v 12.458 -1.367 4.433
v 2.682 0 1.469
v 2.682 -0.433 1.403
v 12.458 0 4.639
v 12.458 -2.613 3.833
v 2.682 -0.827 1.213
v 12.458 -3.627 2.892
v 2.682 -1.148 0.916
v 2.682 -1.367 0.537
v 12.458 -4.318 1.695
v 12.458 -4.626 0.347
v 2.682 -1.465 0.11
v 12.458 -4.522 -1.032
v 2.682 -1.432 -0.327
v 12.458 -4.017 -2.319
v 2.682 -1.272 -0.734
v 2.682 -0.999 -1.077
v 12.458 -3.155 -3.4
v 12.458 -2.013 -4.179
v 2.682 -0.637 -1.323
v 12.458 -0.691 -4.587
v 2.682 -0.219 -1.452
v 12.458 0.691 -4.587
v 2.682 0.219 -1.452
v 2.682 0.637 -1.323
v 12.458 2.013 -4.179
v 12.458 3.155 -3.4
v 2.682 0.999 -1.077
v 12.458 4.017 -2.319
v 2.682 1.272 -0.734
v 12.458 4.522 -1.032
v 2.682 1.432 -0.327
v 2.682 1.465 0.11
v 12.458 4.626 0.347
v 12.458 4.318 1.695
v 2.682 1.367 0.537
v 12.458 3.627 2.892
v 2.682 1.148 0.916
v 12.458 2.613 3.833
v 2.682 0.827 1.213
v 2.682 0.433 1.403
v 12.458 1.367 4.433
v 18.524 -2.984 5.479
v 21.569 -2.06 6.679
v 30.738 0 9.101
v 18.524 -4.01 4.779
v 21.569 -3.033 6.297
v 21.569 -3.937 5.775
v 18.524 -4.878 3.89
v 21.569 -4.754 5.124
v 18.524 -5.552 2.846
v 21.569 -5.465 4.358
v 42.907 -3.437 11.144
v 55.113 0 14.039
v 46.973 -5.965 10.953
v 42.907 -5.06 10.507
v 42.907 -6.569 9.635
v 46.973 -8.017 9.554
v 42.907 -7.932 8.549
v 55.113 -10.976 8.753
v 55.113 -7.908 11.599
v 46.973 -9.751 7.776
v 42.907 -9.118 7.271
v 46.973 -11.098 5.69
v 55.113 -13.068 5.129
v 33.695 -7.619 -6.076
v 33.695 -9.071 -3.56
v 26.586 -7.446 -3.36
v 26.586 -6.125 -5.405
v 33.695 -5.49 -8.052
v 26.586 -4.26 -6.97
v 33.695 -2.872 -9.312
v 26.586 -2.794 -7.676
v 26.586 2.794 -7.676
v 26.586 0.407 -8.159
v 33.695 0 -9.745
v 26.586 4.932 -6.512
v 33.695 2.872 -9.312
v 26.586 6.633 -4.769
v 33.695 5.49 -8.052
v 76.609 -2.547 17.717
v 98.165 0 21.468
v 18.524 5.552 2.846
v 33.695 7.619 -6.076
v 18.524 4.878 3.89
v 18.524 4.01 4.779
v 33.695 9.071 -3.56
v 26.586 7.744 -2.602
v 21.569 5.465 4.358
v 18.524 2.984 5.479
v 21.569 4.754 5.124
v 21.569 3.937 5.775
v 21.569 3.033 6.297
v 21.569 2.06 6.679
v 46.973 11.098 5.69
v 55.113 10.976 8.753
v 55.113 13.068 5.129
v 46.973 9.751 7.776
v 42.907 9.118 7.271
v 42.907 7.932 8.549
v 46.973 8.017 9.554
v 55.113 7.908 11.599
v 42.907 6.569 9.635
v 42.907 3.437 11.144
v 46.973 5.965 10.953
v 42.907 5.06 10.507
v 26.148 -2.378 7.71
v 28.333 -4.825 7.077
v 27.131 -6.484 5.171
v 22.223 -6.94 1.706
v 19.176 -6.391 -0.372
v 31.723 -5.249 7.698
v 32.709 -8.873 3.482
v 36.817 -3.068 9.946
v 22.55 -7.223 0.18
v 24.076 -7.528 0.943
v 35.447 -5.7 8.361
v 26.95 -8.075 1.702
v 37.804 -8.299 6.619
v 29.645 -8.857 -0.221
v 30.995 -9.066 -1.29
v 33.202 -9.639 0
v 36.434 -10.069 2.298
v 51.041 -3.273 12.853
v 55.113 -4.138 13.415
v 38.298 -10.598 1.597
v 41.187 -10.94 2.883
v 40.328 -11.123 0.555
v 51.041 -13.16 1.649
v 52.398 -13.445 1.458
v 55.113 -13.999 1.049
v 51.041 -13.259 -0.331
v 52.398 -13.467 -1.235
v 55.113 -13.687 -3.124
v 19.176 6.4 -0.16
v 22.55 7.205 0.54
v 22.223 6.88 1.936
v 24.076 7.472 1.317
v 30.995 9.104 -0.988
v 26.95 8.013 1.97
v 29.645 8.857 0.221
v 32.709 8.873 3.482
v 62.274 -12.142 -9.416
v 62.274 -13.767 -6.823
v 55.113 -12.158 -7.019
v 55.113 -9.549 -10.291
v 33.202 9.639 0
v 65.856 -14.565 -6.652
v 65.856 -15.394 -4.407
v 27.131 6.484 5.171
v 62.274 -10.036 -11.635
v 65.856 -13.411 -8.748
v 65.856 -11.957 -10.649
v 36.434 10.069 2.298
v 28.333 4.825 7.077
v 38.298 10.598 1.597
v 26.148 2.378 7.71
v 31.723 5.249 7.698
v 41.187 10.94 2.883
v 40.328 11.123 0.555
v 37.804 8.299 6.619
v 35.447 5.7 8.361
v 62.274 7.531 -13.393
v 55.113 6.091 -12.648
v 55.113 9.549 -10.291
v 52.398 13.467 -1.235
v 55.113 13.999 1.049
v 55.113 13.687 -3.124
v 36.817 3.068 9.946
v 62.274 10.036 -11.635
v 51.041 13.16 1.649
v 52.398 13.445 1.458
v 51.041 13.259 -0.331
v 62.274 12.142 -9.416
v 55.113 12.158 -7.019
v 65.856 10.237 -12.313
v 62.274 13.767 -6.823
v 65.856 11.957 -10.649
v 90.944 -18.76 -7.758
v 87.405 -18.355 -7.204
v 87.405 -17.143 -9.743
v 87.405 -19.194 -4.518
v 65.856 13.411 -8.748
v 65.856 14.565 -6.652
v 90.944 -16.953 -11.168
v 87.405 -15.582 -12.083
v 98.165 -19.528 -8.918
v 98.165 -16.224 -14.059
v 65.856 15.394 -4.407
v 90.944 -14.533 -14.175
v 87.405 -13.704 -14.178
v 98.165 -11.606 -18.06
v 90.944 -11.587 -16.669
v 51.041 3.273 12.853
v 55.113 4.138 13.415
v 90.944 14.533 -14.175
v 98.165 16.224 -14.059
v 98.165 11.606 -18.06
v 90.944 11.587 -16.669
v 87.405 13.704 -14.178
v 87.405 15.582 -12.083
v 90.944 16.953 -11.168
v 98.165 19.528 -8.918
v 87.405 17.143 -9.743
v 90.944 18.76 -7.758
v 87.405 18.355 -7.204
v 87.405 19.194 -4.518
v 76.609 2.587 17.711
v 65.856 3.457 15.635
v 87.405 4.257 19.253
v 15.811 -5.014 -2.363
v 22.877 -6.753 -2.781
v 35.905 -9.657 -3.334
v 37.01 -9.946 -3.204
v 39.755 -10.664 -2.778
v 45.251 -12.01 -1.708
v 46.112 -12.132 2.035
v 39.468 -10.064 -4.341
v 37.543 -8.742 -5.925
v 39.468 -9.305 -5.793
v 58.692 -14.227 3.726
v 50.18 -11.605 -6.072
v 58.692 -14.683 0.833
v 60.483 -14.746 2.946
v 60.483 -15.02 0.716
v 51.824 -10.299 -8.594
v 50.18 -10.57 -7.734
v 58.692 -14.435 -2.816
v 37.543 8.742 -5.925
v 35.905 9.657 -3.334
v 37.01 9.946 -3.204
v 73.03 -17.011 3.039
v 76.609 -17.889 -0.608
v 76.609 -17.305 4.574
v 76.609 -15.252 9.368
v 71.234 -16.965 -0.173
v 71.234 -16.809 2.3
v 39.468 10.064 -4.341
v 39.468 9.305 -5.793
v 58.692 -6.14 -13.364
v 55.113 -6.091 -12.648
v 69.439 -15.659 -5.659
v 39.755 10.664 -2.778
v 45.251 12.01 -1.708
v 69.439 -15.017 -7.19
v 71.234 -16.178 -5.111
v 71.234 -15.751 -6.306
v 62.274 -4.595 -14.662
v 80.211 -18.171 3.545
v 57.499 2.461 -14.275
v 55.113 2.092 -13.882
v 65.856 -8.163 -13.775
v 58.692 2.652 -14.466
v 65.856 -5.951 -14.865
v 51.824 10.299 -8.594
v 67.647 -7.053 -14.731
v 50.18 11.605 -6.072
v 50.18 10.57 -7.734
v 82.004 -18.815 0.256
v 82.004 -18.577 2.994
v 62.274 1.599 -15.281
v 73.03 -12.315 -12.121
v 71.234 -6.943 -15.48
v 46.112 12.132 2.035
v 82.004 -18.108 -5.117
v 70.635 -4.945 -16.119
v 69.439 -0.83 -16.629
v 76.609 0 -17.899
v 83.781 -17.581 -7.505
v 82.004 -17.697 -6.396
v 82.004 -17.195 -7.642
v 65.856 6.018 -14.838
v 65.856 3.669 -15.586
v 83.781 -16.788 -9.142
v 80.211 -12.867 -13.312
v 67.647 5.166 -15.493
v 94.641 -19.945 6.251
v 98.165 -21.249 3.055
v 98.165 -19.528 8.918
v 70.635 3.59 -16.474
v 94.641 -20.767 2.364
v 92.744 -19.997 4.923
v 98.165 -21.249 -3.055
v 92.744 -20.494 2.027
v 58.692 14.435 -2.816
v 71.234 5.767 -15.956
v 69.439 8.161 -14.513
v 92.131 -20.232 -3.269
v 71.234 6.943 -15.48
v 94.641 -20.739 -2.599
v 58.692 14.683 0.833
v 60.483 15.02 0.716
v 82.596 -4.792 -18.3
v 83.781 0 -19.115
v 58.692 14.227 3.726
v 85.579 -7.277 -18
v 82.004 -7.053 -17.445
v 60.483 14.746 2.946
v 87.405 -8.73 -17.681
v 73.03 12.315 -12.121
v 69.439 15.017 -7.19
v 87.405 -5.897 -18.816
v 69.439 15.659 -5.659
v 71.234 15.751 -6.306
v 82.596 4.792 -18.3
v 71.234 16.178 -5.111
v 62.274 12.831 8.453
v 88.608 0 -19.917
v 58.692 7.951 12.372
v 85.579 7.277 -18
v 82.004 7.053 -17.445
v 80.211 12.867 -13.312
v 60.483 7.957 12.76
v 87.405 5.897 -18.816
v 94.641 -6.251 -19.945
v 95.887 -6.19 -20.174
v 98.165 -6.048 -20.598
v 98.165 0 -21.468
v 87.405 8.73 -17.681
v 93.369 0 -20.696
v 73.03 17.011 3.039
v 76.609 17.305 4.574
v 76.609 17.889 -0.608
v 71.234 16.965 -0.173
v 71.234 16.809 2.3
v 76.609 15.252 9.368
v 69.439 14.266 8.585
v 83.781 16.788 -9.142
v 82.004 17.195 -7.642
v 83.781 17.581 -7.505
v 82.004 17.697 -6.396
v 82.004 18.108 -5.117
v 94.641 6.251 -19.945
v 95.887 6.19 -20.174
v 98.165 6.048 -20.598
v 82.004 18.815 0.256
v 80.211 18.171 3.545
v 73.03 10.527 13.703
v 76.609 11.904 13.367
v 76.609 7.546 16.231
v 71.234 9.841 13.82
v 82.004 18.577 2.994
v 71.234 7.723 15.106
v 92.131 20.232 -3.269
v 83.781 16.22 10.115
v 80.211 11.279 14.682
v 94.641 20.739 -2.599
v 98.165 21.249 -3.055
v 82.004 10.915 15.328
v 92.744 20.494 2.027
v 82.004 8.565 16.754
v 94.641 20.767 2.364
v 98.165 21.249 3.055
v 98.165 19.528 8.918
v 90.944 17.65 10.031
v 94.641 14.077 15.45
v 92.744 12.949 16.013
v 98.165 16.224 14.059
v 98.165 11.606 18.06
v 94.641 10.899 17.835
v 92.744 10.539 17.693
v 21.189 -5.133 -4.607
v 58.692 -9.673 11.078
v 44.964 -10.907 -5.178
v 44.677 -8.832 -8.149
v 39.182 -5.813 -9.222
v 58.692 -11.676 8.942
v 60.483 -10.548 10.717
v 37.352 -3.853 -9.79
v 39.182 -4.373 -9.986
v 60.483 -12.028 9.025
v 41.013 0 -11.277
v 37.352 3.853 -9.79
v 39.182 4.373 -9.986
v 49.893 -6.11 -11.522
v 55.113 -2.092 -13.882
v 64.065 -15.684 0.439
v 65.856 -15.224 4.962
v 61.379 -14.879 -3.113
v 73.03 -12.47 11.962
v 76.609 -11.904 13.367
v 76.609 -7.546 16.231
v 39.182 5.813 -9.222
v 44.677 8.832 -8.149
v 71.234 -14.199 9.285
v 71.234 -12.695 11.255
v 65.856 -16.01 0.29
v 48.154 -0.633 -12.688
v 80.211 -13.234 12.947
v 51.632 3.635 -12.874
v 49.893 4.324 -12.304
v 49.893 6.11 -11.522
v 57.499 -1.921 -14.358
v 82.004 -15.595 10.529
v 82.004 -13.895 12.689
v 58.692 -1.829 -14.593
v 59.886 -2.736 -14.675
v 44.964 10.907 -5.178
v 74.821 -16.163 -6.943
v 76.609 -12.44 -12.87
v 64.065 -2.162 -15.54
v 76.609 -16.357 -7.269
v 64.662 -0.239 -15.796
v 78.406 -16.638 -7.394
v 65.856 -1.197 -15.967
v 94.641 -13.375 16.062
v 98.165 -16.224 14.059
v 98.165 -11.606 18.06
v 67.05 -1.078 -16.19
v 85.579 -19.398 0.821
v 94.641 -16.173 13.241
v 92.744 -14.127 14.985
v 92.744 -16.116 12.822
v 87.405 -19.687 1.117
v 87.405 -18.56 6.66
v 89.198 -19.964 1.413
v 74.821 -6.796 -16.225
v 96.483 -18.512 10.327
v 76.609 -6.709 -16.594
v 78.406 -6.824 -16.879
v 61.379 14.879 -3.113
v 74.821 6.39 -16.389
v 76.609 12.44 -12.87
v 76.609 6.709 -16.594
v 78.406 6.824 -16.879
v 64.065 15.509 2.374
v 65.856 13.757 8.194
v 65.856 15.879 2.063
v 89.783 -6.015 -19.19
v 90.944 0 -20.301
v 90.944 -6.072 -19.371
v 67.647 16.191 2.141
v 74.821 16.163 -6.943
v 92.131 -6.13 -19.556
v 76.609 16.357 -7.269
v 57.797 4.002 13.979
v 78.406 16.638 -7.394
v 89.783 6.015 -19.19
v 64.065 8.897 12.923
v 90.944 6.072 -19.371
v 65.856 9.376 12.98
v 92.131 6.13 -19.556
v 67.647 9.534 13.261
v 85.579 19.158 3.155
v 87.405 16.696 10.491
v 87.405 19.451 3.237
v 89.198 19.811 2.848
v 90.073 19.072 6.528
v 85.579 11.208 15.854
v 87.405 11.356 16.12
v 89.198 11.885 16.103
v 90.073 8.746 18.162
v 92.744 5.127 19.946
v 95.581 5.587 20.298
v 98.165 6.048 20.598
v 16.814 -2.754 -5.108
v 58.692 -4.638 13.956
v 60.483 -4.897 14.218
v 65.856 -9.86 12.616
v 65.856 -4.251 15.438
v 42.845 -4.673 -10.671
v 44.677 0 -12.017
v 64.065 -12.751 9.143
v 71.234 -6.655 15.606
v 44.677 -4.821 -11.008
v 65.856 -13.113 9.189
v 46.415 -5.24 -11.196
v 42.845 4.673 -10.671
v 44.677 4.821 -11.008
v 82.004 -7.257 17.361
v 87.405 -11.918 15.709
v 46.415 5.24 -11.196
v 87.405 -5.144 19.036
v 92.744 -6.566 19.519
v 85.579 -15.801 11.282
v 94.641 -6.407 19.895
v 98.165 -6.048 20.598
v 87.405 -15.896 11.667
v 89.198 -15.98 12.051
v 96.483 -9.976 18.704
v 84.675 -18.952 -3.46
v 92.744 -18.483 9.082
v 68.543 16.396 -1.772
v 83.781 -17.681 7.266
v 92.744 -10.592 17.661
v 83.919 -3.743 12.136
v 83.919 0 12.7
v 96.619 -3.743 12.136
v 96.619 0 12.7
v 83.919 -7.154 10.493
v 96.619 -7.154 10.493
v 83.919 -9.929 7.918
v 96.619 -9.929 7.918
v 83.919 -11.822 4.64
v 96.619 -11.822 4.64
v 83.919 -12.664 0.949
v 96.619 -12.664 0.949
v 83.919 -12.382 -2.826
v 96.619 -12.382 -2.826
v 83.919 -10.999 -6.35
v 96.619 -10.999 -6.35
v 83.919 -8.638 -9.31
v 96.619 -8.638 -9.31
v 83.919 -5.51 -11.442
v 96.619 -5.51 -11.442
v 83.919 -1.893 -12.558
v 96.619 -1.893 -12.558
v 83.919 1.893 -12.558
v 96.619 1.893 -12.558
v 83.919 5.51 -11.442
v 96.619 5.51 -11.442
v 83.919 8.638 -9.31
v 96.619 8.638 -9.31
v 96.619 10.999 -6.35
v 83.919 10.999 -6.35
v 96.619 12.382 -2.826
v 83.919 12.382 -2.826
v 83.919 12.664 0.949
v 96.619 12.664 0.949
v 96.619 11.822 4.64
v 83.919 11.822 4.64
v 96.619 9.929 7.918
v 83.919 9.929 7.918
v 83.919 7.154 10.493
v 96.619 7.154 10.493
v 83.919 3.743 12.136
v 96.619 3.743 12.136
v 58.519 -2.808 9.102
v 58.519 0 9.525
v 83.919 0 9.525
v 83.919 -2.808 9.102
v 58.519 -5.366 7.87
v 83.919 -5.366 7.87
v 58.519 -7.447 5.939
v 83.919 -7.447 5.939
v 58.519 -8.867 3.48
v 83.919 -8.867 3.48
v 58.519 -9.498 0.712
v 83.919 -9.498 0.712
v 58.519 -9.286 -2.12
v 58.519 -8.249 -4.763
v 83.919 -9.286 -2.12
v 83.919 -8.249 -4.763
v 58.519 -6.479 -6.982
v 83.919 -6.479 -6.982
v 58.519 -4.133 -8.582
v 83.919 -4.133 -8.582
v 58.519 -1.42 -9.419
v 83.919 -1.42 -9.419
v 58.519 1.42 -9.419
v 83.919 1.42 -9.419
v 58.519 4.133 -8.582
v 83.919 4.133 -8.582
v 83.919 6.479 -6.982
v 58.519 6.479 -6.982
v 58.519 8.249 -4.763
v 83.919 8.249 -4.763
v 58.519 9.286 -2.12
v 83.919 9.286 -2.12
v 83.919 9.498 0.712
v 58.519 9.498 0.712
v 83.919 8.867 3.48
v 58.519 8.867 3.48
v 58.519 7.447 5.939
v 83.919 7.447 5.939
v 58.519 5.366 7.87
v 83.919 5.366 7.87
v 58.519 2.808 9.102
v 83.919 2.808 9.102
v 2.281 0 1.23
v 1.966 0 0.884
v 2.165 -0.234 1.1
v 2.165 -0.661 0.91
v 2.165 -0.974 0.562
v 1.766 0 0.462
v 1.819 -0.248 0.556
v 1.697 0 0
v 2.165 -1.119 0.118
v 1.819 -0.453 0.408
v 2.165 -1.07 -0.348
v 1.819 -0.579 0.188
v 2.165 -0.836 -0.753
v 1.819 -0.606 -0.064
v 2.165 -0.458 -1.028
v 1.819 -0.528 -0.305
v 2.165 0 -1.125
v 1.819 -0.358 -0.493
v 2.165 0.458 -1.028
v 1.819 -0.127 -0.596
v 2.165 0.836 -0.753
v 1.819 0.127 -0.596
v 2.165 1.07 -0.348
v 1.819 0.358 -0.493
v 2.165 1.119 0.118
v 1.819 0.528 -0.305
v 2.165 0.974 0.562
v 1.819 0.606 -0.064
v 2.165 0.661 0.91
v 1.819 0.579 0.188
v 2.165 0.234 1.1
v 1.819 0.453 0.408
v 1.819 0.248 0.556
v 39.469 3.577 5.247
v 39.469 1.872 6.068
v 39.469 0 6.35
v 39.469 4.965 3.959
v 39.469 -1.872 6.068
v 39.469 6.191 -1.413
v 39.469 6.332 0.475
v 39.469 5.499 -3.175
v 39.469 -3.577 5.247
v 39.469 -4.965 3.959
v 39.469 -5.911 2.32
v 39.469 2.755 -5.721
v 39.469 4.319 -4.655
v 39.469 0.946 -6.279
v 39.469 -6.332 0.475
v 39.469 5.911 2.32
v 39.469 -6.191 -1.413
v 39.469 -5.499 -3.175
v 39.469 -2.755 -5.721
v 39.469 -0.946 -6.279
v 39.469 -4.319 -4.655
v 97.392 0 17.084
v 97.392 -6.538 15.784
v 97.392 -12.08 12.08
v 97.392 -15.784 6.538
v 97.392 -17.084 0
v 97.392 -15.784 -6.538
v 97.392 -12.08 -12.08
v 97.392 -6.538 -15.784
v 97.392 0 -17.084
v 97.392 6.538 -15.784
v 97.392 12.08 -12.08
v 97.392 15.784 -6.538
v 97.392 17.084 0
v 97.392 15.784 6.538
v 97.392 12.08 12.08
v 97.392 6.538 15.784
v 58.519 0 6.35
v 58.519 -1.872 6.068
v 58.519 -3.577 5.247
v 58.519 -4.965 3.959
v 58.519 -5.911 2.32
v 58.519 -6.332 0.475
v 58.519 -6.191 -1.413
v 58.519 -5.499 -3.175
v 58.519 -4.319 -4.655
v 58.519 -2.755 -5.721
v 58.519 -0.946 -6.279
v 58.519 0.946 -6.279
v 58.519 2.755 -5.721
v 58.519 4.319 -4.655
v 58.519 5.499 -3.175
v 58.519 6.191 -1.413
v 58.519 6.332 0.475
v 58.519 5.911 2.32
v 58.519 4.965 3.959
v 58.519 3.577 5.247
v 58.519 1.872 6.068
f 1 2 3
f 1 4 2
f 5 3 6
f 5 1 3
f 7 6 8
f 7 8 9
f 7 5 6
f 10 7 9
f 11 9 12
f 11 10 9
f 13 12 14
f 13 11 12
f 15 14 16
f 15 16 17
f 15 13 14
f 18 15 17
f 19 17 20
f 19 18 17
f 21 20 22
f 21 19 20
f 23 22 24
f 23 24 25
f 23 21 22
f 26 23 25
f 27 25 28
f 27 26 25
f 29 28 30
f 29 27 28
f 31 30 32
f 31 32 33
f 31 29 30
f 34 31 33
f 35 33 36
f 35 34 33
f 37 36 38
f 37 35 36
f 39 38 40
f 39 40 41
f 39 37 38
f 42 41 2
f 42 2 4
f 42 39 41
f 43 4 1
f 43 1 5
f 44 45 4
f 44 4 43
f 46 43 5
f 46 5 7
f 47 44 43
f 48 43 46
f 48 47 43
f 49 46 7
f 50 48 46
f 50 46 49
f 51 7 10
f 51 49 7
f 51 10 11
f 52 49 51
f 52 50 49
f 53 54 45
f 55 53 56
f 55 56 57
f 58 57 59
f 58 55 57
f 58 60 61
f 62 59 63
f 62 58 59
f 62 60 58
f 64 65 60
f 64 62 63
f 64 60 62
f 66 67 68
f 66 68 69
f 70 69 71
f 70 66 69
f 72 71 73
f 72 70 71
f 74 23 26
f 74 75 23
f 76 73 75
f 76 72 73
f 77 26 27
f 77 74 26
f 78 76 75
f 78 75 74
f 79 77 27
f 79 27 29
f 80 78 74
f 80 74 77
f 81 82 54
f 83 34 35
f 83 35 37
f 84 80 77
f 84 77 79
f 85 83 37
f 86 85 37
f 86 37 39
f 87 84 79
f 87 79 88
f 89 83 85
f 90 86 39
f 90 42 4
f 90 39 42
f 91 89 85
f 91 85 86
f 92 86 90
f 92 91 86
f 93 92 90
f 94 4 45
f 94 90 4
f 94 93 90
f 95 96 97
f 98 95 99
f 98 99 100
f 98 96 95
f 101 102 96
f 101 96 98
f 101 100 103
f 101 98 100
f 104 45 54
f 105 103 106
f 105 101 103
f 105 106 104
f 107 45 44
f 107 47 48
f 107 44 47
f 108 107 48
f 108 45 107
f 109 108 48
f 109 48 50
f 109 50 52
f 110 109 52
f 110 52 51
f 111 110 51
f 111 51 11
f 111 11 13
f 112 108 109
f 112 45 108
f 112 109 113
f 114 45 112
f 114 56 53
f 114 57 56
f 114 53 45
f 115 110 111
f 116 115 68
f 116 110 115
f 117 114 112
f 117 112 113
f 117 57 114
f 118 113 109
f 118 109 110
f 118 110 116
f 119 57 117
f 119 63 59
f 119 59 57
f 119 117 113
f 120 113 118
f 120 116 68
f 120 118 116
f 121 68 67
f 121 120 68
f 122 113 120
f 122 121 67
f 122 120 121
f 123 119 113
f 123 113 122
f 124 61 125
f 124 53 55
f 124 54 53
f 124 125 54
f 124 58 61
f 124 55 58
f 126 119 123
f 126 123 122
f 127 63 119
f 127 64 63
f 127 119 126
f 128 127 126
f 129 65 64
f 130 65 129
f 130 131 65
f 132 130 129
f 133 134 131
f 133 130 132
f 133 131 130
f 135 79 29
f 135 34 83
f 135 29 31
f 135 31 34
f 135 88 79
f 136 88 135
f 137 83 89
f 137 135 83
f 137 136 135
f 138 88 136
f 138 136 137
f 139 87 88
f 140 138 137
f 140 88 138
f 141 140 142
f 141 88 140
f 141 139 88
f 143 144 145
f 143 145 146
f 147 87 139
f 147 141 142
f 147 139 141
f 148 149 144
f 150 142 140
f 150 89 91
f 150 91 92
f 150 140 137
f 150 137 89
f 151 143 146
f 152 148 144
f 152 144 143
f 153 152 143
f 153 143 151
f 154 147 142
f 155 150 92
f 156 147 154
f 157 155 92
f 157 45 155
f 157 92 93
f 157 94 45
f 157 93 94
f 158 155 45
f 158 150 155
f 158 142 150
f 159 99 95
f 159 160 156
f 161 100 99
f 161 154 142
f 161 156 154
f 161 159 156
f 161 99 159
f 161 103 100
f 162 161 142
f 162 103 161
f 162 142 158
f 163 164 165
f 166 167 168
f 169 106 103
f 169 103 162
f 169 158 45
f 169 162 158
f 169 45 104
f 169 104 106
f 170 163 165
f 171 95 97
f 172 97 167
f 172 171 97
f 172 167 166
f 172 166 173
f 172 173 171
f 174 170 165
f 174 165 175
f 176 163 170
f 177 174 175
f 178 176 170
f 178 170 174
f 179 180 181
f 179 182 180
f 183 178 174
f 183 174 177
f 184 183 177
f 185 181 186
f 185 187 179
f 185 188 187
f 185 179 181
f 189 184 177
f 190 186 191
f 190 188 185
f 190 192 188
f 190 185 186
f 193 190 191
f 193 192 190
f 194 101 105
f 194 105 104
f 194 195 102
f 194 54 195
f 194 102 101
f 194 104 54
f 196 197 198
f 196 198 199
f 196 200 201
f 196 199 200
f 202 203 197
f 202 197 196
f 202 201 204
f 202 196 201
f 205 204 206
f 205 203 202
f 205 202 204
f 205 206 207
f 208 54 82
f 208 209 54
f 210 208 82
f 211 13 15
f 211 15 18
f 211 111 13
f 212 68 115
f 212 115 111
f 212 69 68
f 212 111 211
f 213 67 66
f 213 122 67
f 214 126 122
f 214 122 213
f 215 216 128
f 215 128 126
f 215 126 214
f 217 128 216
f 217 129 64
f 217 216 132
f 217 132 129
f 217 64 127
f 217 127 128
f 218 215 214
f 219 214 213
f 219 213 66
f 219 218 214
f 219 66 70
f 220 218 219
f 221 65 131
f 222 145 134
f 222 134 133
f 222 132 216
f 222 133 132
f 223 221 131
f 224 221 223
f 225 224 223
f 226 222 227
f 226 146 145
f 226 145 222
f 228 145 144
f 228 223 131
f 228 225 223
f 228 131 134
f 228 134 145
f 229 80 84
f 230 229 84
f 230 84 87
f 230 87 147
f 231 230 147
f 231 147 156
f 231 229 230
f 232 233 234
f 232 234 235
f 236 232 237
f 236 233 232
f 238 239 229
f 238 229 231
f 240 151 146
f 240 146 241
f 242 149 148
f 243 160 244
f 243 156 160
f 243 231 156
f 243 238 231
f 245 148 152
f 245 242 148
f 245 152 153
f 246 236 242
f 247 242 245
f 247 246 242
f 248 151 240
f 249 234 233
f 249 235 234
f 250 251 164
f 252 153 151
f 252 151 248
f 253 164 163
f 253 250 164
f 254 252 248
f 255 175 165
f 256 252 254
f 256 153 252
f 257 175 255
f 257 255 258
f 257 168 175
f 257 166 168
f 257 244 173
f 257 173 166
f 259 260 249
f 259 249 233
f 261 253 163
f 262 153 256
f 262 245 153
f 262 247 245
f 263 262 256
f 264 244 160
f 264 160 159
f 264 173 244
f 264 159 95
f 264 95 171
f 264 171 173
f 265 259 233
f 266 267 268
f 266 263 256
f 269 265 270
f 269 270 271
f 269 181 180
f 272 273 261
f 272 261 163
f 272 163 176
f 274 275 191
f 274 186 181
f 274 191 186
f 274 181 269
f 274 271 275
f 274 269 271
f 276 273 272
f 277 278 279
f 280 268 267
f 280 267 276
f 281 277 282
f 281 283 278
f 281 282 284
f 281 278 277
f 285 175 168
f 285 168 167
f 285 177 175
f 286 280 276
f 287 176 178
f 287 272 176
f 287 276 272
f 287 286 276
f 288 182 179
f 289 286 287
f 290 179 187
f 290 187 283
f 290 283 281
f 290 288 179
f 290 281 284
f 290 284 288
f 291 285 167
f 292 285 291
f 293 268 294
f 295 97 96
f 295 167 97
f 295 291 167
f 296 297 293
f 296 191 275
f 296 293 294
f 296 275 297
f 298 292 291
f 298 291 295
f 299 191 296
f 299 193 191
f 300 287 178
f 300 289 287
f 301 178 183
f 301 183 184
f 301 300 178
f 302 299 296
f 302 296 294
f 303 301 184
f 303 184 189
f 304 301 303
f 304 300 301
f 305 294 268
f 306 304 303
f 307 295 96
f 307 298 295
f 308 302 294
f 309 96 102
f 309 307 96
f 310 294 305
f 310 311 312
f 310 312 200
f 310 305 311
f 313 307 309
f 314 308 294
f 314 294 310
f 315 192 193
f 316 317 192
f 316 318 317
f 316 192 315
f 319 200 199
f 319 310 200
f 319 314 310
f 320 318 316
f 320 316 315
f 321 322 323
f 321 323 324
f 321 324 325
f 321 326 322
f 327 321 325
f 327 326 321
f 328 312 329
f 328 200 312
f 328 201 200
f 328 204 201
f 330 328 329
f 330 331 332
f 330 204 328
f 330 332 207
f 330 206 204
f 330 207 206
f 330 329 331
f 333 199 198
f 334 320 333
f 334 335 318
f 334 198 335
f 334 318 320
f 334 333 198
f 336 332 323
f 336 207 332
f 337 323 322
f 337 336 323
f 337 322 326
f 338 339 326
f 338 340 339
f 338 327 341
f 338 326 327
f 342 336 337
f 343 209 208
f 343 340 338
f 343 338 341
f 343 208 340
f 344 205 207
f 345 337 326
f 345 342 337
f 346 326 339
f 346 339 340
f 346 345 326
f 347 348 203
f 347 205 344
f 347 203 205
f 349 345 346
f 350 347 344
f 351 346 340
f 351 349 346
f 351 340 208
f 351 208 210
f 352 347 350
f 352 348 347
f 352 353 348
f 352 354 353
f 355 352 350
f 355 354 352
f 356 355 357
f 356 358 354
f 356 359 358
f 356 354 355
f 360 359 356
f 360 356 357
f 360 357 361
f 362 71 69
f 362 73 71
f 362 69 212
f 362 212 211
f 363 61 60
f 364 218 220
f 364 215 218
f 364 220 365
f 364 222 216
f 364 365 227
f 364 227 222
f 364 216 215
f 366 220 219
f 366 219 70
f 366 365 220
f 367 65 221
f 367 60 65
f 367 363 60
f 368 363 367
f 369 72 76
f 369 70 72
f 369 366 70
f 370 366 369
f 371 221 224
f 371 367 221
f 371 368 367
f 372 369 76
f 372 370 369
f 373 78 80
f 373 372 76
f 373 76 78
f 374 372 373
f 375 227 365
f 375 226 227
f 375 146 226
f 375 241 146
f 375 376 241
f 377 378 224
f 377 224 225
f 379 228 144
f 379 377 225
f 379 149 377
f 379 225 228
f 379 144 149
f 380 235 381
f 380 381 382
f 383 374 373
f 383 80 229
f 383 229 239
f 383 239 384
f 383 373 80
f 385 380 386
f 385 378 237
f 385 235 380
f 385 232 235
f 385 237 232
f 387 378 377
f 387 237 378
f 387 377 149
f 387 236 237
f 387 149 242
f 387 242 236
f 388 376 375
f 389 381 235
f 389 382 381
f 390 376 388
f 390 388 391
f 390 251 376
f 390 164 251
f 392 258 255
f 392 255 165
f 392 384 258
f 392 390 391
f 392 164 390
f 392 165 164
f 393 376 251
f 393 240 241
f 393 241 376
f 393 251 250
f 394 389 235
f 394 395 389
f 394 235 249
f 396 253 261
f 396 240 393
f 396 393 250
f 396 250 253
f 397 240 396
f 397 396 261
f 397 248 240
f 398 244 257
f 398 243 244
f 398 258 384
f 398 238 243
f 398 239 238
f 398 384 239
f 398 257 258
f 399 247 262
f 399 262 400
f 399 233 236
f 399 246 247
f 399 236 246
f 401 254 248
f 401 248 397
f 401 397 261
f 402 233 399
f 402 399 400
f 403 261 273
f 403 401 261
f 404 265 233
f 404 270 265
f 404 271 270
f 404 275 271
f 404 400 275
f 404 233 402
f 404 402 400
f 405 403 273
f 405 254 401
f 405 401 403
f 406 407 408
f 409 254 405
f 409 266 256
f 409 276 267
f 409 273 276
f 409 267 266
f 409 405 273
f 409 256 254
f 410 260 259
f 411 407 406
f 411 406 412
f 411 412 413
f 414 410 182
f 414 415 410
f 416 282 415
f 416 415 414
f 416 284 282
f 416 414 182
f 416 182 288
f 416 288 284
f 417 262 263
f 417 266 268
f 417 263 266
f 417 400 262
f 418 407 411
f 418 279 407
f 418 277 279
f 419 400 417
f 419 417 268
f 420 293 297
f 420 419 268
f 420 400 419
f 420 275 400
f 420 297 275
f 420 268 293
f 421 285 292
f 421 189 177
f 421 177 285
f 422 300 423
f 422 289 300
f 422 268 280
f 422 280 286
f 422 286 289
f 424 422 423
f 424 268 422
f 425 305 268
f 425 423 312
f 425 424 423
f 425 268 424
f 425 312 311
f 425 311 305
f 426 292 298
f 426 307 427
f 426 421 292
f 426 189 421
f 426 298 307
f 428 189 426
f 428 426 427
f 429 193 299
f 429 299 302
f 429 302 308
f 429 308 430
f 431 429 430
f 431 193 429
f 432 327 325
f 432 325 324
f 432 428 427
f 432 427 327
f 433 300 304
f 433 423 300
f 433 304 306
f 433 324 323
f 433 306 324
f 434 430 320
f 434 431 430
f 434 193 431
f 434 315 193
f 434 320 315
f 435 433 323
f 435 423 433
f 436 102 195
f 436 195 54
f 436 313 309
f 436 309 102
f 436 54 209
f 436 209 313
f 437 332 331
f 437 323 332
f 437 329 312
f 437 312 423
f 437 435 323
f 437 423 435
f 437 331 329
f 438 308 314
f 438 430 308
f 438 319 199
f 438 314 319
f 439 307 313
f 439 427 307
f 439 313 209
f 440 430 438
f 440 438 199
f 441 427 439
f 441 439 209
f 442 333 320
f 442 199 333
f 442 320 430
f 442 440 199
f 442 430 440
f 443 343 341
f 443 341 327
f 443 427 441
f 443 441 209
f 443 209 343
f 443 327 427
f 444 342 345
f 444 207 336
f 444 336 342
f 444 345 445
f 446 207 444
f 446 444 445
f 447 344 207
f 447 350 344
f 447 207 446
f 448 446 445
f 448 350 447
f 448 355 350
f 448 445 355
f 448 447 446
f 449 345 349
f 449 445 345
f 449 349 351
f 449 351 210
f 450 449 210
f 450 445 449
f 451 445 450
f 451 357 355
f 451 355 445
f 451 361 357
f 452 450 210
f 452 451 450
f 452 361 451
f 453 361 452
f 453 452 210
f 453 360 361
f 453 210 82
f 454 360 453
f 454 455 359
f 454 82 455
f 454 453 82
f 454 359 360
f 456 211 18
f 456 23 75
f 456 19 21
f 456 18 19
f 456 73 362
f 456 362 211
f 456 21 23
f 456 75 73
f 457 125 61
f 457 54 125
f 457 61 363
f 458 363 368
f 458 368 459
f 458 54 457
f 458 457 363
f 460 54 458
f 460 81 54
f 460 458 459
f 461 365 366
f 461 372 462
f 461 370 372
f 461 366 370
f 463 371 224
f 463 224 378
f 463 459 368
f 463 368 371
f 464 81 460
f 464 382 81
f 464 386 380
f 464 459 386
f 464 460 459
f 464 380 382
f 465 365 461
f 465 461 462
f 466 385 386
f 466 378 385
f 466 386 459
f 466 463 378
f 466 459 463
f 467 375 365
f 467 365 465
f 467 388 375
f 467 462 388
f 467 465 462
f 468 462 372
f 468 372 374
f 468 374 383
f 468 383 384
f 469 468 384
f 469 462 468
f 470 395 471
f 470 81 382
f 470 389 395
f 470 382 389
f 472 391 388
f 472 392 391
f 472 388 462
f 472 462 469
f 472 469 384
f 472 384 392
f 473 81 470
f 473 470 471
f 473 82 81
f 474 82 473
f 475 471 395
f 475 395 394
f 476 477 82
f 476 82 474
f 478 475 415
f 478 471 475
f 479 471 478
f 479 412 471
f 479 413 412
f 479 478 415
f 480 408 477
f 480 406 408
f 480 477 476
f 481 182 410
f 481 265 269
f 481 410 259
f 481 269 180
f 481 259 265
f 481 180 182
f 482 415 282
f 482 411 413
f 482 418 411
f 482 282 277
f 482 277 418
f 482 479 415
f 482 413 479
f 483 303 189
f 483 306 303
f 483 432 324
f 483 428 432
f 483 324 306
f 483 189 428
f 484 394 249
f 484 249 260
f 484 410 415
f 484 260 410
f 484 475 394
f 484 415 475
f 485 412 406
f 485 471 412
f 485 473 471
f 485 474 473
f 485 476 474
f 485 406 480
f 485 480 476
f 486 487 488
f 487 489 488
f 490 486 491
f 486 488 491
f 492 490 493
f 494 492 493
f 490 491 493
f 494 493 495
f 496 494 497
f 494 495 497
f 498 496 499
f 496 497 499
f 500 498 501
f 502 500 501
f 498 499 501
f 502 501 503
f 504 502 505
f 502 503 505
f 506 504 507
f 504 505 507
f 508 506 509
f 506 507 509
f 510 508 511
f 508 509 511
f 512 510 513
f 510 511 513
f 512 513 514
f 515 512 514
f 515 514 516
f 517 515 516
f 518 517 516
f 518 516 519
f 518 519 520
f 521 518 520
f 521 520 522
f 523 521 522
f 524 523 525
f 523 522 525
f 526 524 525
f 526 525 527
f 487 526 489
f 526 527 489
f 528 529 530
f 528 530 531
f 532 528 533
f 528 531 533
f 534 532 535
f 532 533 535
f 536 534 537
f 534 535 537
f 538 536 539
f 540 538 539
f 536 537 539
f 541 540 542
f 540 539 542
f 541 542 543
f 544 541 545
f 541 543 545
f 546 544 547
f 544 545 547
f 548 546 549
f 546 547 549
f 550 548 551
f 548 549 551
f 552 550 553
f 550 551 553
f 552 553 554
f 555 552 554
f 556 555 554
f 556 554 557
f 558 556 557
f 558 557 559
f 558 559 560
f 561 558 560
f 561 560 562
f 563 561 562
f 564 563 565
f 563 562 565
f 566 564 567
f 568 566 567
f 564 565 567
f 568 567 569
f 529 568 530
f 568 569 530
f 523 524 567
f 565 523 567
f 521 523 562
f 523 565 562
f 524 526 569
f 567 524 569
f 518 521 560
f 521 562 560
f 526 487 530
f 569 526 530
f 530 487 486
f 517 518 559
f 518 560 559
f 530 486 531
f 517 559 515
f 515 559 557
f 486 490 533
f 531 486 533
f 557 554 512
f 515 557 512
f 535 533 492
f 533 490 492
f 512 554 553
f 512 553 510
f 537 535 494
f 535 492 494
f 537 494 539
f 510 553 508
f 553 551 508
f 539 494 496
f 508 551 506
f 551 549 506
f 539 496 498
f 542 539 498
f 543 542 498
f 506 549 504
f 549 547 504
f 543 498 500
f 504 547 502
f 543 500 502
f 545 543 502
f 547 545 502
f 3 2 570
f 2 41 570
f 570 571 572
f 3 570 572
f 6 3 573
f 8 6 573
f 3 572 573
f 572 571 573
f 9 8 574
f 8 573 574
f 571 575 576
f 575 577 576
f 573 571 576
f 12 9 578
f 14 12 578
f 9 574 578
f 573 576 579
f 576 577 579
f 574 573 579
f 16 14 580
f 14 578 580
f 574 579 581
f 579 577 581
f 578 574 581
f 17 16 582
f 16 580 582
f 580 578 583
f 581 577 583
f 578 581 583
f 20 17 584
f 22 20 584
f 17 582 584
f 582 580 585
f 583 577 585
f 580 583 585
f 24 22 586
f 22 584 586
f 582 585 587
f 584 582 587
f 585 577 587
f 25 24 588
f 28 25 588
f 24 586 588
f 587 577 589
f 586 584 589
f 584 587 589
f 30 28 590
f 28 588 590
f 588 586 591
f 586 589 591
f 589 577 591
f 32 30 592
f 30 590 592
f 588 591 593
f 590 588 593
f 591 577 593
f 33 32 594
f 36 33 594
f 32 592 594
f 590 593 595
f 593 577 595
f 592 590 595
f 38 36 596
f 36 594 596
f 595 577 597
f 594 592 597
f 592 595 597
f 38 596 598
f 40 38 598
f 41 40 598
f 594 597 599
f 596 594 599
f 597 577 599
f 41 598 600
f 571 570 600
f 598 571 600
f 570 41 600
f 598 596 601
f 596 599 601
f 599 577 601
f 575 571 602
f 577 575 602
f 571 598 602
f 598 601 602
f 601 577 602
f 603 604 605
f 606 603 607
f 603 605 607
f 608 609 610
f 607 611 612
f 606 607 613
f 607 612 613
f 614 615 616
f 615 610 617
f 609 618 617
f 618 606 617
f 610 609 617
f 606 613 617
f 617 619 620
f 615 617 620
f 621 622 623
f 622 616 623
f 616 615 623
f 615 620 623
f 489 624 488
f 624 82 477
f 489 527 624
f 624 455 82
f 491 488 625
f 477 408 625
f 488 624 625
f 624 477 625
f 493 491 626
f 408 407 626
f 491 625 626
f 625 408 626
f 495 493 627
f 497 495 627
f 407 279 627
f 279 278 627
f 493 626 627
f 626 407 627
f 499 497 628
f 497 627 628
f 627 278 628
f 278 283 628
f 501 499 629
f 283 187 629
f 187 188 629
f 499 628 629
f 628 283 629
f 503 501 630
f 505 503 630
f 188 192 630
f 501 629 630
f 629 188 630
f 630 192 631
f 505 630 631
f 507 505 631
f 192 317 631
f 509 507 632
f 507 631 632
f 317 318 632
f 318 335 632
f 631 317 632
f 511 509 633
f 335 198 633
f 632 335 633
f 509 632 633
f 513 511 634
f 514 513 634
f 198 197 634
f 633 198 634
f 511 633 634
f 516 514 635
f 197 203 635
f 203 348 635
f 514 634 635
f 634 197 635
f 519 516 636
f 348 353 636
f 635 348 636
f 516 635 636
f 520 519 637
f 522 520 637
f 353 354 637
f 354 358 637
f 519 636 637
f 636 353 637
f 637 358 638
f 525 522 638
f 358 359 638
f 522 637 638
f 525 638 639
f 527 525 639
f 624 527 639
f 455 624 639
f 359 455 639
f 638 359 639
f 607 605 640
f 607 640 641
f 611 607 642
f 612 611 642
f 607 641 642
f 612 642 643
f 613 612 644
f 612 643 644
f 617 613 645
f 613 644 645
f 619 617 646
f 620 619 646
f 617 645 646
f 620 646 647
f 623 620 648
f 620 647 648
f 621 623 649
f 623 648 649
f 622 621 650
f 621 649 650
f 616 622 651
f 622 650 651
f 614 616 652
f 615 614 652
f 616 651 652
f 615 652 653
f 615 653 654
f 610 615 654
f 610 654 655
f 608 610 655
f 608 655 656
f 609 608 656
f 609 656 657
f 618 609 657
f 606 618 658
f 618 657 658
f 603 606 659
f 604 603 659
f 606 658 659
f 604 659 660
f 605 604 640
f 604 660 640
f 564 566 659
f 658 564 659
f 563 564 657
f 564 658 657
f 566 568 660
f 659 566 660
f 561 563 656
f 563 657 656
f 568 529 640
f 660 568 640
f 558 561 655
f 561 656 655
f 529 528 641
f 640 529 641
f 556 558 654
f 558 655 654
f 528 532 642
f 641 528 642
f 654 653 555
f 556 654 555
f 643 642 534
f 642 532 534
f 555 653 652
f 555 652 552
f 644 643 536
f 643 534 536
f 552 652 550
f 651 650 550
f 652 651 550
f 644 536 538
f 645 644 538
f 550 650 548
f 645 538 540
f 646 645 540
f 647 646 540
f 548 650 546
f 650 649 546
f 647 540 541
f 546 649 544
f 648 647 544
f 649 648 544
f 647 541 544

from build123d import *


with BuildPart() as part:
    # Sketch1 → Revolve2 (revolve)
    with BuildSketch(Plane(origin=(0, 0, 0), x_dir=(1, 0, 0), z_dir=(0, 1, 0)), mode=Mode.PRIVATE) as revolve2_sk:
        with BuildLine():
            Line((1.697321091, 0), (39.469405392, 0))
            Line((39.469405392, 0), (39.469405392, 6.35))
            Line((39.469405392, 6.35), (58.519405392, 6.35))
            Line((58.519405392, 6.35), (58.519405392, 9.525))
            Line((58.519405392, 9.525), (83.919405392, 9.525))
            Line((83.919405392, 9.525), (83.919405392, 12.7))
            Line((83.919405392, 12.7), (96.619405392, 12.7))
            Line((96.619405392, 12.7), (98.165428581, 21.4679332))
            add(Edge.make_bspline(
                [(2.682127148, 1.468644362), (2.982092127, 1.591742283), (3.982765764, 1.986976913), (6.075542743, 2.735585346), (9.959285205, 3.961402854), (15.35260807, 5.458934046), (21.847317263, 7.086678944), (29.055363889, 8.749177841), (36.286920774, 10.313744718), (43.531901048, 11.801111844), (50.793776988, 13.226984496), (58.058153921, 14.599266319), (64.433980883, 15.762645369), (69.883896781, 16.732062359), (74.459068804, 17.529825957), (78.065425347, 18.150661812), (81.784961377, 18.781283529), (85.307065103, 19.372441088), (89.168740248, 20.010357493), (92.45838759, 20.54964543), (95.664328261, 21.067043036), (97.333372349, 21.334925019), (98.164963492, 21.467858845), (98.165428581, 21.4679332)],
                knots=[0.027847292, 0.027847292, 0.027847292, 0.027847292, 0.027847292, 0.039565322, 0.06672611, 0.108155752, 0.174993972, 0.2418322, 0.308670423, 0.375508647, 0.442346873, 0.509185099, 0.576023325, 0.642861549, 0.676280662, 0.709699776, 0.743118888, 0.776538001, 0.809957114, 0.843376227, 0.87679534, 0.910214452, 0.910233153, 0.910233153, 0.910233153, 0.910233153, 0.910233153], degree=4))
            ThreePointArc((2.682127148, 1.468644362), (1.966311917, 0.884132234), (1.697321091, 0))
        make_face()
    revolve(revolve2_sk.sketch.rotate(Axis((0, 0, 0), (1, 0, 0)), 180), axis=Axis((0, 0, 0), (1, 0, 0)))


solid = part.part
